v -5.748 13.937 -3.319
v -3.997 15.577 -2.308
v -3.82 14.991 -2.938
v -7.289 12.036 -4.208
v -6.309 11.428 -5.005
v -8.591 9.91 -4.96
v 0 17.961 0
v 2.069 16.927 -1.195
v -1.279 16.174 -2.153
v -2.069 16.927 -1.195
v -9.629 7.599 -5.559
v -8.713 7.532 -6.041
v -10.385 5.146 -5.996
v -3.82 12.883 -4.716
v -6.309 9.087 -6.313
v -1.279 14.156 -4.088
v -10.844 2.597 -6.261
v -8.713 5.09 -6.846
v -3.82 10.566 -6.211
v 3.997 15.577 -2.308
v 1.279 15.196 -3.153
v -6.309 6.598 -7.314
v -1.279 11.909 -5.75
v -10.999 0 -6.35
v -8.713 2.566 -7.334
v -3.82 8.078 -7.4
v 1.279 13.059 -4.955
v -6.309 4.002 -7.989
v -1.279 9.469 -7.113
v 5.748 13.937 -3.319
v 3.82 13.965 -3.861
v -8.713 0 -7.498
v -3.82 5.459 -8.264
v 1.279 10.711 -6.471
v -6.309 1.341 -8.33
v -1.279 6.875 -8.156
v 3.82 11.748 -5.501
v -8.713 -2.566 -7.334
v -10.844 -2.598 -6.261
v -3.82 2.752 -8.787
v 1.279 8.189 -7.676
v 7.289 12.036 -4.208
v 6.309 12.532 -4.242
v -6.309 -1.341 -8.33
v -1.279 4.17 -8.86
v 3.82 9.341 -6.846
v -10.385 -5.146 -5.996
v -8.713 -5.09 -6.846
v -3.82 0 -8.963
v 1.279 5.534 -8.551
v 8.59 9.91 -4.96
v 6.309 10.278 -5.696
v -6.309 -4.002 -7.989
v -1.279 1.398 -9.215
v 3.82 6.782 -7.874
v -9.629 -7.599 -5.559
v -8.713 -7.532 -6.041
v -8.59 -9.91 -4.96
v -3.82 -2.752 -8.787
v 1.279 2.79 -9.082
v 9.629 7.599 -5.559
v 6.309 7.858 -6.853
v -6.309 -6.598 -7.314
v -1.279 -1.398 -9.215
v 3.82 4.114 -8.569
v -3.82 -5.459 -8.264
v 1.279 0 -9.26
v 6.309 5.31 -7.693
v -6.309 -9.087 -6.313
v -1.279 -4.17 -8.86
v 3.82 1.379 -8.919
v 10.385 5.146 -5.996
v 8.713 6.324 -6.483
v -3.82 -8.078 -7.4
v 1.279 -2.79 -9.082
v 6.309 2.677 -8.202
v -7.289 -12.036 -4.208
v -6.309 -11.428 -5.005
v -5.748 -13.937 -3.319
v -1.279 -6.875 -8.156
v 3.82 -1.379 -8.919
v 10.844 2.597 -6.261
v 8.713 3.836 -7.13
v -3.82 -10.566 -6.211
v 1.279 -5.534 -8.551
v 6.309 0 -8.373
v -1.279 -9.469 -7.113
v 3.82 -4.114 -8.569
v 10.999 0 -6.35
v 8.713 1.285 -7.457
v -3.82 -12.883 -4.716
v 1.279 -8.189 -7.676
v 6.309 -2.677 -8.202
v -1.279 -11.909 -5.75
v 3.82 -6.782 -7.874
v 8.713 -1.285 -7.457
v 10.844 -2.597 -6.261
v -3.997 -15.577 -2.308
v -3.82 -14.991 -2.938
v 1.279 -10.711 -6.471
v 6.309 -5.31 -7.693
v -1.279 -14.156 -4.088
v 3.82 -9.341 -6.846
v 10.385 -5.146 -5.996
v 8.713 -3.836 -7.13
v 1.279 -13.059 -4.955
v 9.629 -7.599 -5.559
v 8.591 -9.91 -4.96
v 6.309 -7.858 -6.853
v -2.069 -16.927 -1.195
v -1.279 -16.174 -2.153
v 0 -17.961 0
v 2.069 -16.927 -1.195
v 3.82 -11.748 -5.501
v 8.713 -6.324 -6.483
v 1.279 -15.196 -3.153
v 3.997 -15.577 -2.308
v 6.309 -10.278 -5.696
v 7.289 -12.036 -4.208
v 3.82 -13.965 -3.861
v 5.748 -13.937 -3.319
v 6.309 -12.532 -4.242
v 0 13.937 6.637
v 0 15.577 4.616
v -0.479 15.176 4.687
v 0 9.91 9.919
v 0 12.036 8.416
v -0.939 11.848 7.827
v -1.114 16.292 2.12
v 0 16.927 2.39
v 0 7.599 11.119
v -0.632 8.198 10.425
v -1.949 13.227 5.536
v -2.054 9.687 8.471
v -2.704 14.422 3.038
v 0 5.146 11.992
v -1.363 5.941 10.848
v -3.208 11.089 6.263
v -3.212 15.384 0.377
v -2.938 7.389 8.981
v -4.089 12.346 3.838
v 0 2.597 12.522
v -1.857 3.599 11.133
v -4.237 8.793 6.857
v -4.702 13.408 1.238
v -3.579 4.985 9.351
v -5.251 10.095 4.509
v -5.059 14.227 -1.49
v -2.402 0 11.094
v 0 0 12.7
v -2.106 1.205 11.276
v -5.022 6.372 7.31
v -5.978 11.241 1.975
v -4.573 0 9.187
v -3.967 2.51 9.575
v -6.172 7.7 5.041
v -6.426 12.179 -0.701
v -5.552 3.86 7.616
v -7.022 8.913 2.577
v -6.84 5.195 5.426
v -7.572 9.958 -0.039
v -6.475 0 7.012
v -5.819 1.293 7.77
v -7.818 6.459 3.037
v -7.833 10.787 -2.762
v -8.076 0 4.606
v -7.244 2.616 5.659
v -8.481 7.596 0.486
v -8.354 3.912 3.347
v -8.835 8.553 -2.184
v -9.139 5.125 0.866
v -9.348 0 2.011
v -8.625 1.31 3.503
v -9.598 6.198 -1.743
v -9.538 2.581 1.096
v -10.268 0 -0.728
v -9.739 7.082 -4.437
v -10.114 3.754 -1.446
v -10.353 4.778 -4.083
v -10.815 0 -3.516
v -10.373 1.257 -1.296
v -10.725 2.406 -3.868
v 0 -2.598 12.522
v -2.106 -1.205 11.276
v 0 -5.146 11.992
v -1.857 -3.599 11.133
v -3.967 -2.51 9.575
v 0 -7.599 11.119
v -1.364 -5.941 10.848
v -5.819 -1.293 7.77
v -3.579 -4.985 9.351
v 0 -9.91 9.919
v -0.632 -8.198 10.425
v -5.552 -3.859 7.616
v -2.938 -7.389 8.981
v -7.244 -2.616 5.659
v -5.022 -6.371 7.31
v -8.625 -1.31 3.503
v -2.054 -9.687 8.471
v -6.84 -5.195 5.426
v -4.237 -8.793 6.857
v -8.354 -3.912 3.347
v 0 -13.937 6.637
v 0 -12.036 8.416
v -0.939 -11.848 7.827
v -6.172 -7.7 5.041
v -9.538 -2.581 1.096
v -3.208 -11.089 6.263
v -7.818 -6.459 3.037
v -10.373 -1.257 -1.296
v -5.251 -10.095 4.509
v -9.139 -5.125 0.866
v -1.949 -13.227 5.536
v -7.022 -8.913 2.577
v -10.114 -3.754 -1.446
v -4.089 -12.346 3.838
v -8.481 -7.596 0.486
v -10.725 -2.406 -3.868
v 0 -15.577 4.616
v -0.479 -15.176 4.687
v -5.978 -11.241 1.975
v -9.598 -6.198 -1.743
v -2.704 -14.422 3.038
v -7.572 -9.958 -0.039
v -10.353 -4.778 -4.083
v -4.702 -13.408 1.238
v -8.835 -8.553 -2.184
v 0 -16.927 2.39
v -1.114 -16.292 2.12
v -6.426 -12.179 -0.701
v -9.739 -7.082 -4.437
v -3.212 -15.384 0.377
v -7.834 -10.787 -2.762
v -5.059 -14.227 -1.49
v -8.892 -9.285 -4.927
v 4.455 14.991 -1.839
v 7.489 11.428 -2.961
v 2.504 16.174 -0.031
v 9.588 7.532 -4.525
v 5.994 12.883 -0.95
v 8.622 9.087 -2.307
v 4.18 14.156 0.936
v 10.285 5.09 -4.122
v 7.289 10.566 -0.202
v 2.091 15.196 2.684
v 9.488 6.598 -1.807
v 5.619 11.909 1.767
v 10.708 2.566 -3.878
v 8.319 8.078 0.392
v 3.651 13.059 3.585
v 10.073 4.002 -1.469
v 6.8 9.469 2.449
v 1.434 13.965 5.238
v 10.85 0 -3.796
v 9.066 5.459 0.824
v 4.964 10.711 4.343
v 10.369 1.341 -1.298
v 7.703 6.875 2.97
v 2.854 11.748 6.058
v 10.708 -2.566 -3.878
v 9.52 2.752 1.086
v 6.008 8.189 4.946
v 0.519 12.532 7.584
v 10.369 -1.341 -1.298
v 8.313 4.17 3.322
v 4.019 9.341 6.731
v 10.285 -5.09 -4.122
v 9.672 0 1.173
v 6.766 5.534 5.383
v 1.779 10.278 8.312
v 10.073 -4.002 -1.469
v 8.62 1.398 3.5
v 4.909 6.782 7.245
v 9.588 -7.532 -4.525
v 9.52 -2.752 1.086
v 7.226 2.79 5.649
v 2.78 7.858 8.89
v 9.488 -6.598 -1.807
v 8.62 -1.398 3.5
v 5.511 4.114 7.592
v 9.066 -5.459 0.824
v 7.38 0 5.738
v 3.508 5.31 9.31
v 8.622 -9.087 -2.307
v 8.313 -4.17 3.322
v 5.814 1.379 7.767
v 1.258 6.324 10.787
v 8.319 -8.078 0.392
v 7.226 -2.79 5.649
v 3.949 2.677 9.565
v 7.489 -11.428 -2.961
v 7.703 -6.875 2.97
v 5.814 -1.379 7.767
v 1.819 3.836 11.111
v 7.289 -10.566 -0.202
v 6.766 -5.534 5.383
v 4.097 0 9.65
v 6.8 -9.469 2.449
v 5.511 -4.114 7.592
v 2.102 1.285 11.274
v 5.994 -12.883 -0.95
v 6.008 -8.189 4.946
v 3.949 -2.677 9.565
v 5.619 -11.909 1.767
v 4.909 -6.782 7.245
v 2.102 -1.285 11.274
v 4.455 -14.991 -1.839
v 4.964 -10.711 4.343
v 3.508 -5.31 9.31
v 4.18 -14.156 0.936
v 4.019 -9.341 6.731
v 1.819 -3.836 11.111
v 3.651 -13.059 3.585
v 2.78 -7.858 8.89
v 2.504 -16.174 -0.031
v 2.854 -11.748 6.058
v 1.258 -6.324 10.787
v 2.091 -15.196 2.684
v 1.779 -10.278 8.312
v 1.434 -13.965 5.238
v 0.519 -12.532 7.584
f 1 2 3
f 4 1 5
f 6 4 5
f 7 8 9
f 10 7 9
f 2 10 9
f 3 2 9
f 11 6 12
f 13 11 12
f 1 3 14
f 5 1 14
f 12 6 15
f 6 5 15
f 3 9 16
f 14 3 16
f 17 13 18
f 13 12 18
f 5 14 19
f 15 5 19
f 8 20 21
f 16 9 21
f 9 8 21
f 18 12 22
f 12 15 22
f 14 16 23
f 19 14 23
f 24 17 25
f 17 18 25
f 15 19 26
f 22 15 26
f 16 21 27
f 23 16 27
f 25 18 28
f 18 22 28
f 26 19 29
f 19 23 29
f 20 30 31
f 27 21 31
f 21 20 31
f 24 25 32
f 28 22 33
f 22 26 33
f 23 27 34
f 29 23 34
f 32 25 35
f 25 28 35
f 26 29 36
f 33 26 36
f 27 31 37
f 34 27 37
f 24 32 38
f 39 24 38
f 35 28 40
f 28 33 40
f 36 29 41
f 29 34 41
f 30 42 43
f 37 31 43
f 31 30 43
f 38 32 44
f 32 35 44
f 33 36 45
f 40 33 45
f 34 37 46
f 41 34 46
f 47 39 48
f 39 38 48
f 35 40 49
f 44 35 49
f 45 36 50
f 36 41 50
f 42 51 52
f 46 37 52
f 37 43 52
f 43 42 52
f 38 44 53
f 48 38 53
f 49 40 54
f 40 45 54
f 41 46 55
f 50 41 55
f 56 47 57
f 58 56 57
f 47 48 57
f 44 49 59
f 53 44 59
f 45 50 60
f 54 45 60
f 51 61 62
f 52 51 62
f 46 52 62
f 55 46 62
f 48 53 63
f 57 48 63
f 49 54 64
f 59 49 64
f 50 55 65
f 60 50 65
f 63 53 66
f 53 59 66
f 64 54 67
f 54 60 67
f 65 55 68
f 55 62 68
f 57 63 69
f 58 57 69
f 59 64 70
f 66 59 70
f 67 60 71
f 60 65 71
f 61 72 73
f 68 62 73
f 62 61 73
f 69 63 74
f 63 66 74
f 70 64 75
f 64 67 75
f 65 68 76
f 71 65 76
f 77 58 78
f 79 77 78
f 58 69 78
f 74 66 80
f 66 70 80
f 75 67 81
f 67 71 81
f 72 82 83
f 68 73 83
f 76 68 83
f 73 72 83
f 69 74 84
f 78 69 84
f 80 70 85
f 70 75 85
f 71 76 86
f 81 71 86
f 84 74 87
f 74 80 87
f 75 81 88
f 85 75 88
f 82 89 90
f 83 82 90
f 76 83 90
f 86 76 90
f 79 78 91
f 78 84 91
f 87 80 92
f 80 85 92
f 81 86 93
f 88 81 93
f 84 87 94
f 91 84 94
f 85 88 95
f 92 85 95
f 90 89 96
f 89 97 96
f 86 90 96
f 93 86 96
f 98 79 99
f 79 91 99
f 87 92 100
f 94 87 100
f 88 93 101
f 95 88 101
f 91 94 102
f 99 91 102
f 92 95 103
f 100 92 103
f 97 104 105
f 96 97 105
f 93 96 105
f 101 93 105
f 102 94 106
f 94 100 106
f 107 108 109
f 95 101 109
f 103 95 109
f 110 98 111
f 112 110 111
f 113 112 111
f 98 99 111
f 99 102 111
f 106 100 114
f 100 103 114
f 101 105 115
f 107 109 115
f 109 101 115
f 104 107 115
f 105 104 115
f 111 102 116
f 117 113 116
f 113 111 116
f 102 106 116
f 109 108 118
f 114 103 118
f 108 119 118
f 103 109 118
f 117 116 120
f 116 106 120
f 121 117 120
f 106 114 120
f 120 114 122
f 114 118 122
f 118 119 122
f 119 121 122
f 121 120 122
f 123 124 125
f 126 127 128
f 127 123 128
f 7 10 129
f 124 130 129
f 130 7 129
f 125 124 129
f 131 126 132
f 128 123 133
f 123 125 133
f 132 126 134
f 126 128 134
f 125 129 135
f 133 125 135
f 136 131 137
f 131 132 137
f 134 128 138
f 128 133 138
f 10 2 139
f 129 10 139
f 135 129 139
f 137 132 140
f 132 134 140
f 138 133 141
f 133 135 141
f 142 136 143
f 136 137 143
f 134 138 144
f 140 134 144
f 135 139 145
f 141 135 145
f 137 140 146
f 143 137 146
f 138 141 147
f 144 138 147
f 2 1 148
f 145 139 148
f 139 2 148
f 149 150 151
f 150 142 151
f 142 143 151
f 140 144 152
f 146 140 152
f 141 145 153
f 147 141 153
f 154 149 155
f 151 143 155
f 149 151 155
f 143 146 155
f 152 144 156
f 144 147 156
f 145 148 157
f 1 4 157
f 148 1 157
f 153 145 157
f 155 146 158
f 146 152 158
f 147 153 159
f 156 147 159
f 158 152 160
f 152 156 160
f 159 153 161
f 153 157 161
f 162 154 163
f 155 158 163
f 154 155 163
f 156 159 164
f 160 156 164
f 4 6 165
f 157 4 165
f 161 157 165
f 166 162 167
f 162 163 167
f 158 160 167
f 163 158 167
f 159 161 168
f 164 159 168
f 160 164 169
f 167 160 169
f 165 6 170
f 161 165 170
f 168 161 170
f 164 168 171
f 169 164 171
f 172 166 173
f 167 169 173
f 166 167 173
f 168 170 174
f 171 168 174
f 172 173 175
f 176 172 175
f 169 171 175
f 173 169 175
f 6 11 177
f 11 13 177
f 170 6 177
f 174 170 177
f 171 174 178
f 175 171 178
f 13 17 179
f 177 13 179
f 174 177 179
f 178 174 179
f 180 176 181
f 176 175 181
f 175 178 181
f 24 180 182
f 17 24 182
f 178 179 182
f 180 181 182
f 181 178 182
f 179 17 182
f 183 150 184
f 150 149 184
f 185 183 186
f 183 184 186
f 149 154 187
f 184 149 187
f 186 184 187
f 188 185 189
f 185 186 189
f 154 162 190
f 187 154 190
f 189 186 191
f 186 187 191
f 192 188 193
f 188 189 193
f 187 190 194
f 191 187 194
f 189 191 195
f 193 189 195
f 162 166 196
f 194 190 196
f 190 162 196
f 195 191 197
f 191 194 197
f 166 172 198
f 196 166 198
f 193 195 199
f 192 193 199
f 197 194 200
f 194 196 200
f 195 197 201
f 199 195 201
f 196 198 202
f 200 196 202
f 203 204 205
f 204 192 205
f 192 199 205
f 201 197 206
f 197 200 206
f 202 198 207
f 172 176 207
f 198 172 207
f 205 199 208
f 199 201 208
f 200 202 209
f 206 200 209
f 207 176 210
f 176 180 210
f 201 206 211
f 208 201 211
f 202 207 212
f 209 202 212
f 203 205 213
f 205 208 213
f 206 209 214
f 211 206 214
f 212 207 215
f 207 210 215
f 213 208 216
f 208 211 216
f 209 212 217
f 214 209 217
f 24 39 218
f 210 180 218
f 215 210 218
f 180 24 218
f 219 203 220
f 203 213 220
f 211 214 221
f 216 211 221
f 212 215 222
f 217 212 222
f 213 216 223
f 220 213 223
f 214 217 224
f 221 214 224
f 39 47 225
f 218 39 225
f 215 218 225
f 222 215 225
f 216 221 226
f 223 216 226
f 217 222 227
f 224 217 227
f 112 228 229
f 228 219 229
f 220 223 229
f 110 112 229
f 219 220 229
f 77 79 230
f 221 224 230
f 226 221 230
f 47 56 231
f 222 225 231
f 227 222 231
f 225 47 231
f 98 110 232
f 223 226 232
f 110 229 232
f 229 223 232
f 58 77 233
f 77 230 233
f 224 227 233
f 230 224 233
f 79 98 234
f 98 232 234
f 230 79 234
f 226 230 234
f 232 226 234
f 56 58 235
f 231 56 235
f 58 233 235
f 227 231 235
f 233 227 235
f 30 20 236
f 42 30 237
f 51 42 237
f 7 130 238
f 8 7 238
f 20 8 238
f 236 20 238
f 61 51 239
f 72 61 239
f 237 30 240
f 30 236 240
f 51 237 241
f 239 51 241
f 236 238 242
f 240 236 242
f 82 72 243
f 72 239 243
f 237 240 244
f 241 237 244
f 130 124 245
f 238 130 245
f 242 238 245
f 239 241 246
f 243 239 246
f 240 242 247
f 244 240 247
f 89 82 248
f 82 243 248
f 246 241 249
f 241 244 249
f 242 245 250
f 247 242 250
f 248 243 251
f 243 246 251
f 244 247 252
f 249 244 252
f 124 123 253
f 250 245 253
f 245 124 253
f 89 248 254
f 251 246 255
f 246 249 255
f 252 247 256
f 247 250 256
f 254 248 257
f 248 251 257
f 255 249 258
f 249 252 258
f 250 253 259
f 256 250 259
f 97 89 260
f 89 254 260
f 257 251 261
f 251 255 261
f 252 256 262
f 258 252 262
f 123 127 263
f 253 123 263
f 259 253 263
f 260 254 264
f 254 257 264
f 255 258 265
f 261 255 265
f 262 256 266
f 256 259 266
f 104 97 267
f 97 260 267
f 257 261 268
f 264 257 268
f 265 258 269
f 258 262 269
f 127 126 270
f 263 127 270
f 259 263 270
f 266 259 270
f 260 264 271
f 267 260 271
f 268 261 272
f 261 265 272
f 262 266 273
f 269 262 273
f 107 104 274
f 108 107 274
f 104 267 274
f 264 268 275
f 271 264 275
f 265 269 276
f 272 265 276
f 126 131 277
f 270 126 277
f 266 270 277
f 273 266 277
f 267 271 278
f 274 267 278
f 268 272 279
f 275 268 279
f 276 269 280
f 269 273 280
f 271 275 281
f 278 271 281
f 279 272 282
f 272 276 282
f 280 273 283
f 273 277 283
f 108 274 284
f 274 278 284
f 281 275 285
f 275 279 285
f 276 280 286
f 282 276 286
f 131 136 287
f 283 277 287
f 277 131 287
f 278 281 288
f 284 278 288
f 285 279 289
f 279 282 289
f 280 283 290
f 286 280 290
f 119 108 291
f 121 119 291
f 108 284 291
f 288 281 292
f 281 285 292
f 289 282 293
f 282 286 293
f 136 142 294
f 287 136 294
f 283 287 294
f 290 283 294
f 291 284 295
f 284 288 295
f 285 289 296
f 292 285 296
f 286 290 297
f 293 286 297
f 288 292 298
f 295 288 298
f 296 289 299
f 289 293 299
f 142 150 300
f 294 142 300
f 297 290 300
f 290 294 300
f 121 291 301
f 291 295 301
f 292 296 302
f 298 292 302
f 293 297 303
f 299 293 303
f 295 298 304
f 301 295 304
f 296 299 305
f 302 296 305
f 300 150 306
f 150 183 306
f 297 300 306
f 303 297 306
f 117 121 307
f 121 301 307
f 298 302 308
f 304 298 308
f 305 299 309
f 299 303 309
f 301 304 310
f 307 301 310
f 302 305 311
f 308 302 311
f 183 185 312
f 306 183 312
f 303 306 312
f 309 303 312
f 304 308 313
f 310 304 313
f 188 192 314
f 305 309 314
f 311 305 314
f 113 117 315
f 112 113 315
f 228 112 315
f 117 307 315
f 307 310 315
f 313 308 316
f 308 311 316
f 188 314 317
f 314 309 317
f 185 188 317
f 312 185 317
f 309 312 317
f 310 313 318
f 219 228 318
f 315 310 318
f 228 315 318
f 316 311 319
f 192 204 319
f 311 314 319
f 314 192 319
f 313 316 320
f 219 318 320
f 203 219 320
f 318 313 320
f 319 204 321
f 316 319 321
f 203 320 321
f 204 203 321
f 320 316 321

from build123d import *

# Parameters (mm, degrees)
F1_ANGLE_BACK = 90
F1_ANGLE      = 180
F2_ANGLE_BACK = 90
F2_ANGLE      = 180
F3_ANGLE_BACK = 90
F3_ANGLE      = 180


with BuildPart() as f1:
    # F0 (on Front) → F1 (revolve)
    with BuildSketch(Plane.XZ, mode=Mode.PRIVATE) as f1_sk:
        with BuildLine():
            ThreePointArc((10.9985226281, -6.35), (8.0514773719, 4.6485226281), (0, 12.7))
            ThreePointArc((0, 12.7), (-8.0514773719, 4.6485226281), (-10.9985226281, -6.35))
            ThreePointArc((-10.9985226281, -6.35), (0, -9.2970452561), (10.9985226281, -6.35))
        make_face()
    revolve(f1_sk.sketch.rotate(Axis((12.3773198276, 0, -3.961853197), (0.5, 0, 0.8660254038)), -F1_ANGLE_BACK), axis=Axis((12.3773198276, 0, -3.961853197), (0.5, 0, 0.8660254038)), revolution_arc=F1_ANGLE)

    # F0 (on Front) → F2 (revolve, intersect)
    with BuildSketch(Plane.XZ, mode=Mode.PRIVATE) as f2_sk:
        with BuildLine():
            ThreePointArc((10.9985226281, -6.35), (8.0514773719, 4.6485226281), (0, 12.7))
            ThreePointArc((0, 12.7), (-8.0514773719, 4.6485226281), (-10.9985226281, -6.35))
            ThreePointArc((-10.9985226281, -6.35), (0, -9.2970452561), (10.9985226281, -6.35))
        make_face()
    revolve(f2_sk.sketch.rotate(Axis((-2.7575943991, 0, 12.7), (-1, 0, 0)), -F2_ANGLE_BACK), axis=Axis((-2.7575943991, 0, 12.7), (-1, 0, 0)), revolution_arc=F2_ANGLE, mode=Mode.INTERSECT)

    # F0 (on Front) → F3 (revolve, intersect)
    with BuildSketch(Plane.XZ, mode=Mode.PRIVATE) as f3_sk:
        with BuildLine():
            ThreePointArc((10.9985226281, -6.35), (8.0514773719, 4.6485226281), (0, 12.7))
            ThreePointArc((0, 12.7), (-8.0514773719, 4.6485226281), (-10.9985226281, -6.35))
            ThreePointArc((-10.9985226281, -6.35), (0, -9.2970452561), (10.9985226281, -6.35))
        make_face()
    revolve(f3_sk.sketch.rotate(Axis((-9.6197254285, 0, -8.738146803), (0.5, 0, -0.8660254038)), -F3_ANGLE_BACK), axis=Axis((-9.6197254285, 0, -8.738146803), (0.5, 0, -0.8660254038)), revolution_arc=F3_ANGLE, mode=Mode.INTERSECT)


solid = f1.part
